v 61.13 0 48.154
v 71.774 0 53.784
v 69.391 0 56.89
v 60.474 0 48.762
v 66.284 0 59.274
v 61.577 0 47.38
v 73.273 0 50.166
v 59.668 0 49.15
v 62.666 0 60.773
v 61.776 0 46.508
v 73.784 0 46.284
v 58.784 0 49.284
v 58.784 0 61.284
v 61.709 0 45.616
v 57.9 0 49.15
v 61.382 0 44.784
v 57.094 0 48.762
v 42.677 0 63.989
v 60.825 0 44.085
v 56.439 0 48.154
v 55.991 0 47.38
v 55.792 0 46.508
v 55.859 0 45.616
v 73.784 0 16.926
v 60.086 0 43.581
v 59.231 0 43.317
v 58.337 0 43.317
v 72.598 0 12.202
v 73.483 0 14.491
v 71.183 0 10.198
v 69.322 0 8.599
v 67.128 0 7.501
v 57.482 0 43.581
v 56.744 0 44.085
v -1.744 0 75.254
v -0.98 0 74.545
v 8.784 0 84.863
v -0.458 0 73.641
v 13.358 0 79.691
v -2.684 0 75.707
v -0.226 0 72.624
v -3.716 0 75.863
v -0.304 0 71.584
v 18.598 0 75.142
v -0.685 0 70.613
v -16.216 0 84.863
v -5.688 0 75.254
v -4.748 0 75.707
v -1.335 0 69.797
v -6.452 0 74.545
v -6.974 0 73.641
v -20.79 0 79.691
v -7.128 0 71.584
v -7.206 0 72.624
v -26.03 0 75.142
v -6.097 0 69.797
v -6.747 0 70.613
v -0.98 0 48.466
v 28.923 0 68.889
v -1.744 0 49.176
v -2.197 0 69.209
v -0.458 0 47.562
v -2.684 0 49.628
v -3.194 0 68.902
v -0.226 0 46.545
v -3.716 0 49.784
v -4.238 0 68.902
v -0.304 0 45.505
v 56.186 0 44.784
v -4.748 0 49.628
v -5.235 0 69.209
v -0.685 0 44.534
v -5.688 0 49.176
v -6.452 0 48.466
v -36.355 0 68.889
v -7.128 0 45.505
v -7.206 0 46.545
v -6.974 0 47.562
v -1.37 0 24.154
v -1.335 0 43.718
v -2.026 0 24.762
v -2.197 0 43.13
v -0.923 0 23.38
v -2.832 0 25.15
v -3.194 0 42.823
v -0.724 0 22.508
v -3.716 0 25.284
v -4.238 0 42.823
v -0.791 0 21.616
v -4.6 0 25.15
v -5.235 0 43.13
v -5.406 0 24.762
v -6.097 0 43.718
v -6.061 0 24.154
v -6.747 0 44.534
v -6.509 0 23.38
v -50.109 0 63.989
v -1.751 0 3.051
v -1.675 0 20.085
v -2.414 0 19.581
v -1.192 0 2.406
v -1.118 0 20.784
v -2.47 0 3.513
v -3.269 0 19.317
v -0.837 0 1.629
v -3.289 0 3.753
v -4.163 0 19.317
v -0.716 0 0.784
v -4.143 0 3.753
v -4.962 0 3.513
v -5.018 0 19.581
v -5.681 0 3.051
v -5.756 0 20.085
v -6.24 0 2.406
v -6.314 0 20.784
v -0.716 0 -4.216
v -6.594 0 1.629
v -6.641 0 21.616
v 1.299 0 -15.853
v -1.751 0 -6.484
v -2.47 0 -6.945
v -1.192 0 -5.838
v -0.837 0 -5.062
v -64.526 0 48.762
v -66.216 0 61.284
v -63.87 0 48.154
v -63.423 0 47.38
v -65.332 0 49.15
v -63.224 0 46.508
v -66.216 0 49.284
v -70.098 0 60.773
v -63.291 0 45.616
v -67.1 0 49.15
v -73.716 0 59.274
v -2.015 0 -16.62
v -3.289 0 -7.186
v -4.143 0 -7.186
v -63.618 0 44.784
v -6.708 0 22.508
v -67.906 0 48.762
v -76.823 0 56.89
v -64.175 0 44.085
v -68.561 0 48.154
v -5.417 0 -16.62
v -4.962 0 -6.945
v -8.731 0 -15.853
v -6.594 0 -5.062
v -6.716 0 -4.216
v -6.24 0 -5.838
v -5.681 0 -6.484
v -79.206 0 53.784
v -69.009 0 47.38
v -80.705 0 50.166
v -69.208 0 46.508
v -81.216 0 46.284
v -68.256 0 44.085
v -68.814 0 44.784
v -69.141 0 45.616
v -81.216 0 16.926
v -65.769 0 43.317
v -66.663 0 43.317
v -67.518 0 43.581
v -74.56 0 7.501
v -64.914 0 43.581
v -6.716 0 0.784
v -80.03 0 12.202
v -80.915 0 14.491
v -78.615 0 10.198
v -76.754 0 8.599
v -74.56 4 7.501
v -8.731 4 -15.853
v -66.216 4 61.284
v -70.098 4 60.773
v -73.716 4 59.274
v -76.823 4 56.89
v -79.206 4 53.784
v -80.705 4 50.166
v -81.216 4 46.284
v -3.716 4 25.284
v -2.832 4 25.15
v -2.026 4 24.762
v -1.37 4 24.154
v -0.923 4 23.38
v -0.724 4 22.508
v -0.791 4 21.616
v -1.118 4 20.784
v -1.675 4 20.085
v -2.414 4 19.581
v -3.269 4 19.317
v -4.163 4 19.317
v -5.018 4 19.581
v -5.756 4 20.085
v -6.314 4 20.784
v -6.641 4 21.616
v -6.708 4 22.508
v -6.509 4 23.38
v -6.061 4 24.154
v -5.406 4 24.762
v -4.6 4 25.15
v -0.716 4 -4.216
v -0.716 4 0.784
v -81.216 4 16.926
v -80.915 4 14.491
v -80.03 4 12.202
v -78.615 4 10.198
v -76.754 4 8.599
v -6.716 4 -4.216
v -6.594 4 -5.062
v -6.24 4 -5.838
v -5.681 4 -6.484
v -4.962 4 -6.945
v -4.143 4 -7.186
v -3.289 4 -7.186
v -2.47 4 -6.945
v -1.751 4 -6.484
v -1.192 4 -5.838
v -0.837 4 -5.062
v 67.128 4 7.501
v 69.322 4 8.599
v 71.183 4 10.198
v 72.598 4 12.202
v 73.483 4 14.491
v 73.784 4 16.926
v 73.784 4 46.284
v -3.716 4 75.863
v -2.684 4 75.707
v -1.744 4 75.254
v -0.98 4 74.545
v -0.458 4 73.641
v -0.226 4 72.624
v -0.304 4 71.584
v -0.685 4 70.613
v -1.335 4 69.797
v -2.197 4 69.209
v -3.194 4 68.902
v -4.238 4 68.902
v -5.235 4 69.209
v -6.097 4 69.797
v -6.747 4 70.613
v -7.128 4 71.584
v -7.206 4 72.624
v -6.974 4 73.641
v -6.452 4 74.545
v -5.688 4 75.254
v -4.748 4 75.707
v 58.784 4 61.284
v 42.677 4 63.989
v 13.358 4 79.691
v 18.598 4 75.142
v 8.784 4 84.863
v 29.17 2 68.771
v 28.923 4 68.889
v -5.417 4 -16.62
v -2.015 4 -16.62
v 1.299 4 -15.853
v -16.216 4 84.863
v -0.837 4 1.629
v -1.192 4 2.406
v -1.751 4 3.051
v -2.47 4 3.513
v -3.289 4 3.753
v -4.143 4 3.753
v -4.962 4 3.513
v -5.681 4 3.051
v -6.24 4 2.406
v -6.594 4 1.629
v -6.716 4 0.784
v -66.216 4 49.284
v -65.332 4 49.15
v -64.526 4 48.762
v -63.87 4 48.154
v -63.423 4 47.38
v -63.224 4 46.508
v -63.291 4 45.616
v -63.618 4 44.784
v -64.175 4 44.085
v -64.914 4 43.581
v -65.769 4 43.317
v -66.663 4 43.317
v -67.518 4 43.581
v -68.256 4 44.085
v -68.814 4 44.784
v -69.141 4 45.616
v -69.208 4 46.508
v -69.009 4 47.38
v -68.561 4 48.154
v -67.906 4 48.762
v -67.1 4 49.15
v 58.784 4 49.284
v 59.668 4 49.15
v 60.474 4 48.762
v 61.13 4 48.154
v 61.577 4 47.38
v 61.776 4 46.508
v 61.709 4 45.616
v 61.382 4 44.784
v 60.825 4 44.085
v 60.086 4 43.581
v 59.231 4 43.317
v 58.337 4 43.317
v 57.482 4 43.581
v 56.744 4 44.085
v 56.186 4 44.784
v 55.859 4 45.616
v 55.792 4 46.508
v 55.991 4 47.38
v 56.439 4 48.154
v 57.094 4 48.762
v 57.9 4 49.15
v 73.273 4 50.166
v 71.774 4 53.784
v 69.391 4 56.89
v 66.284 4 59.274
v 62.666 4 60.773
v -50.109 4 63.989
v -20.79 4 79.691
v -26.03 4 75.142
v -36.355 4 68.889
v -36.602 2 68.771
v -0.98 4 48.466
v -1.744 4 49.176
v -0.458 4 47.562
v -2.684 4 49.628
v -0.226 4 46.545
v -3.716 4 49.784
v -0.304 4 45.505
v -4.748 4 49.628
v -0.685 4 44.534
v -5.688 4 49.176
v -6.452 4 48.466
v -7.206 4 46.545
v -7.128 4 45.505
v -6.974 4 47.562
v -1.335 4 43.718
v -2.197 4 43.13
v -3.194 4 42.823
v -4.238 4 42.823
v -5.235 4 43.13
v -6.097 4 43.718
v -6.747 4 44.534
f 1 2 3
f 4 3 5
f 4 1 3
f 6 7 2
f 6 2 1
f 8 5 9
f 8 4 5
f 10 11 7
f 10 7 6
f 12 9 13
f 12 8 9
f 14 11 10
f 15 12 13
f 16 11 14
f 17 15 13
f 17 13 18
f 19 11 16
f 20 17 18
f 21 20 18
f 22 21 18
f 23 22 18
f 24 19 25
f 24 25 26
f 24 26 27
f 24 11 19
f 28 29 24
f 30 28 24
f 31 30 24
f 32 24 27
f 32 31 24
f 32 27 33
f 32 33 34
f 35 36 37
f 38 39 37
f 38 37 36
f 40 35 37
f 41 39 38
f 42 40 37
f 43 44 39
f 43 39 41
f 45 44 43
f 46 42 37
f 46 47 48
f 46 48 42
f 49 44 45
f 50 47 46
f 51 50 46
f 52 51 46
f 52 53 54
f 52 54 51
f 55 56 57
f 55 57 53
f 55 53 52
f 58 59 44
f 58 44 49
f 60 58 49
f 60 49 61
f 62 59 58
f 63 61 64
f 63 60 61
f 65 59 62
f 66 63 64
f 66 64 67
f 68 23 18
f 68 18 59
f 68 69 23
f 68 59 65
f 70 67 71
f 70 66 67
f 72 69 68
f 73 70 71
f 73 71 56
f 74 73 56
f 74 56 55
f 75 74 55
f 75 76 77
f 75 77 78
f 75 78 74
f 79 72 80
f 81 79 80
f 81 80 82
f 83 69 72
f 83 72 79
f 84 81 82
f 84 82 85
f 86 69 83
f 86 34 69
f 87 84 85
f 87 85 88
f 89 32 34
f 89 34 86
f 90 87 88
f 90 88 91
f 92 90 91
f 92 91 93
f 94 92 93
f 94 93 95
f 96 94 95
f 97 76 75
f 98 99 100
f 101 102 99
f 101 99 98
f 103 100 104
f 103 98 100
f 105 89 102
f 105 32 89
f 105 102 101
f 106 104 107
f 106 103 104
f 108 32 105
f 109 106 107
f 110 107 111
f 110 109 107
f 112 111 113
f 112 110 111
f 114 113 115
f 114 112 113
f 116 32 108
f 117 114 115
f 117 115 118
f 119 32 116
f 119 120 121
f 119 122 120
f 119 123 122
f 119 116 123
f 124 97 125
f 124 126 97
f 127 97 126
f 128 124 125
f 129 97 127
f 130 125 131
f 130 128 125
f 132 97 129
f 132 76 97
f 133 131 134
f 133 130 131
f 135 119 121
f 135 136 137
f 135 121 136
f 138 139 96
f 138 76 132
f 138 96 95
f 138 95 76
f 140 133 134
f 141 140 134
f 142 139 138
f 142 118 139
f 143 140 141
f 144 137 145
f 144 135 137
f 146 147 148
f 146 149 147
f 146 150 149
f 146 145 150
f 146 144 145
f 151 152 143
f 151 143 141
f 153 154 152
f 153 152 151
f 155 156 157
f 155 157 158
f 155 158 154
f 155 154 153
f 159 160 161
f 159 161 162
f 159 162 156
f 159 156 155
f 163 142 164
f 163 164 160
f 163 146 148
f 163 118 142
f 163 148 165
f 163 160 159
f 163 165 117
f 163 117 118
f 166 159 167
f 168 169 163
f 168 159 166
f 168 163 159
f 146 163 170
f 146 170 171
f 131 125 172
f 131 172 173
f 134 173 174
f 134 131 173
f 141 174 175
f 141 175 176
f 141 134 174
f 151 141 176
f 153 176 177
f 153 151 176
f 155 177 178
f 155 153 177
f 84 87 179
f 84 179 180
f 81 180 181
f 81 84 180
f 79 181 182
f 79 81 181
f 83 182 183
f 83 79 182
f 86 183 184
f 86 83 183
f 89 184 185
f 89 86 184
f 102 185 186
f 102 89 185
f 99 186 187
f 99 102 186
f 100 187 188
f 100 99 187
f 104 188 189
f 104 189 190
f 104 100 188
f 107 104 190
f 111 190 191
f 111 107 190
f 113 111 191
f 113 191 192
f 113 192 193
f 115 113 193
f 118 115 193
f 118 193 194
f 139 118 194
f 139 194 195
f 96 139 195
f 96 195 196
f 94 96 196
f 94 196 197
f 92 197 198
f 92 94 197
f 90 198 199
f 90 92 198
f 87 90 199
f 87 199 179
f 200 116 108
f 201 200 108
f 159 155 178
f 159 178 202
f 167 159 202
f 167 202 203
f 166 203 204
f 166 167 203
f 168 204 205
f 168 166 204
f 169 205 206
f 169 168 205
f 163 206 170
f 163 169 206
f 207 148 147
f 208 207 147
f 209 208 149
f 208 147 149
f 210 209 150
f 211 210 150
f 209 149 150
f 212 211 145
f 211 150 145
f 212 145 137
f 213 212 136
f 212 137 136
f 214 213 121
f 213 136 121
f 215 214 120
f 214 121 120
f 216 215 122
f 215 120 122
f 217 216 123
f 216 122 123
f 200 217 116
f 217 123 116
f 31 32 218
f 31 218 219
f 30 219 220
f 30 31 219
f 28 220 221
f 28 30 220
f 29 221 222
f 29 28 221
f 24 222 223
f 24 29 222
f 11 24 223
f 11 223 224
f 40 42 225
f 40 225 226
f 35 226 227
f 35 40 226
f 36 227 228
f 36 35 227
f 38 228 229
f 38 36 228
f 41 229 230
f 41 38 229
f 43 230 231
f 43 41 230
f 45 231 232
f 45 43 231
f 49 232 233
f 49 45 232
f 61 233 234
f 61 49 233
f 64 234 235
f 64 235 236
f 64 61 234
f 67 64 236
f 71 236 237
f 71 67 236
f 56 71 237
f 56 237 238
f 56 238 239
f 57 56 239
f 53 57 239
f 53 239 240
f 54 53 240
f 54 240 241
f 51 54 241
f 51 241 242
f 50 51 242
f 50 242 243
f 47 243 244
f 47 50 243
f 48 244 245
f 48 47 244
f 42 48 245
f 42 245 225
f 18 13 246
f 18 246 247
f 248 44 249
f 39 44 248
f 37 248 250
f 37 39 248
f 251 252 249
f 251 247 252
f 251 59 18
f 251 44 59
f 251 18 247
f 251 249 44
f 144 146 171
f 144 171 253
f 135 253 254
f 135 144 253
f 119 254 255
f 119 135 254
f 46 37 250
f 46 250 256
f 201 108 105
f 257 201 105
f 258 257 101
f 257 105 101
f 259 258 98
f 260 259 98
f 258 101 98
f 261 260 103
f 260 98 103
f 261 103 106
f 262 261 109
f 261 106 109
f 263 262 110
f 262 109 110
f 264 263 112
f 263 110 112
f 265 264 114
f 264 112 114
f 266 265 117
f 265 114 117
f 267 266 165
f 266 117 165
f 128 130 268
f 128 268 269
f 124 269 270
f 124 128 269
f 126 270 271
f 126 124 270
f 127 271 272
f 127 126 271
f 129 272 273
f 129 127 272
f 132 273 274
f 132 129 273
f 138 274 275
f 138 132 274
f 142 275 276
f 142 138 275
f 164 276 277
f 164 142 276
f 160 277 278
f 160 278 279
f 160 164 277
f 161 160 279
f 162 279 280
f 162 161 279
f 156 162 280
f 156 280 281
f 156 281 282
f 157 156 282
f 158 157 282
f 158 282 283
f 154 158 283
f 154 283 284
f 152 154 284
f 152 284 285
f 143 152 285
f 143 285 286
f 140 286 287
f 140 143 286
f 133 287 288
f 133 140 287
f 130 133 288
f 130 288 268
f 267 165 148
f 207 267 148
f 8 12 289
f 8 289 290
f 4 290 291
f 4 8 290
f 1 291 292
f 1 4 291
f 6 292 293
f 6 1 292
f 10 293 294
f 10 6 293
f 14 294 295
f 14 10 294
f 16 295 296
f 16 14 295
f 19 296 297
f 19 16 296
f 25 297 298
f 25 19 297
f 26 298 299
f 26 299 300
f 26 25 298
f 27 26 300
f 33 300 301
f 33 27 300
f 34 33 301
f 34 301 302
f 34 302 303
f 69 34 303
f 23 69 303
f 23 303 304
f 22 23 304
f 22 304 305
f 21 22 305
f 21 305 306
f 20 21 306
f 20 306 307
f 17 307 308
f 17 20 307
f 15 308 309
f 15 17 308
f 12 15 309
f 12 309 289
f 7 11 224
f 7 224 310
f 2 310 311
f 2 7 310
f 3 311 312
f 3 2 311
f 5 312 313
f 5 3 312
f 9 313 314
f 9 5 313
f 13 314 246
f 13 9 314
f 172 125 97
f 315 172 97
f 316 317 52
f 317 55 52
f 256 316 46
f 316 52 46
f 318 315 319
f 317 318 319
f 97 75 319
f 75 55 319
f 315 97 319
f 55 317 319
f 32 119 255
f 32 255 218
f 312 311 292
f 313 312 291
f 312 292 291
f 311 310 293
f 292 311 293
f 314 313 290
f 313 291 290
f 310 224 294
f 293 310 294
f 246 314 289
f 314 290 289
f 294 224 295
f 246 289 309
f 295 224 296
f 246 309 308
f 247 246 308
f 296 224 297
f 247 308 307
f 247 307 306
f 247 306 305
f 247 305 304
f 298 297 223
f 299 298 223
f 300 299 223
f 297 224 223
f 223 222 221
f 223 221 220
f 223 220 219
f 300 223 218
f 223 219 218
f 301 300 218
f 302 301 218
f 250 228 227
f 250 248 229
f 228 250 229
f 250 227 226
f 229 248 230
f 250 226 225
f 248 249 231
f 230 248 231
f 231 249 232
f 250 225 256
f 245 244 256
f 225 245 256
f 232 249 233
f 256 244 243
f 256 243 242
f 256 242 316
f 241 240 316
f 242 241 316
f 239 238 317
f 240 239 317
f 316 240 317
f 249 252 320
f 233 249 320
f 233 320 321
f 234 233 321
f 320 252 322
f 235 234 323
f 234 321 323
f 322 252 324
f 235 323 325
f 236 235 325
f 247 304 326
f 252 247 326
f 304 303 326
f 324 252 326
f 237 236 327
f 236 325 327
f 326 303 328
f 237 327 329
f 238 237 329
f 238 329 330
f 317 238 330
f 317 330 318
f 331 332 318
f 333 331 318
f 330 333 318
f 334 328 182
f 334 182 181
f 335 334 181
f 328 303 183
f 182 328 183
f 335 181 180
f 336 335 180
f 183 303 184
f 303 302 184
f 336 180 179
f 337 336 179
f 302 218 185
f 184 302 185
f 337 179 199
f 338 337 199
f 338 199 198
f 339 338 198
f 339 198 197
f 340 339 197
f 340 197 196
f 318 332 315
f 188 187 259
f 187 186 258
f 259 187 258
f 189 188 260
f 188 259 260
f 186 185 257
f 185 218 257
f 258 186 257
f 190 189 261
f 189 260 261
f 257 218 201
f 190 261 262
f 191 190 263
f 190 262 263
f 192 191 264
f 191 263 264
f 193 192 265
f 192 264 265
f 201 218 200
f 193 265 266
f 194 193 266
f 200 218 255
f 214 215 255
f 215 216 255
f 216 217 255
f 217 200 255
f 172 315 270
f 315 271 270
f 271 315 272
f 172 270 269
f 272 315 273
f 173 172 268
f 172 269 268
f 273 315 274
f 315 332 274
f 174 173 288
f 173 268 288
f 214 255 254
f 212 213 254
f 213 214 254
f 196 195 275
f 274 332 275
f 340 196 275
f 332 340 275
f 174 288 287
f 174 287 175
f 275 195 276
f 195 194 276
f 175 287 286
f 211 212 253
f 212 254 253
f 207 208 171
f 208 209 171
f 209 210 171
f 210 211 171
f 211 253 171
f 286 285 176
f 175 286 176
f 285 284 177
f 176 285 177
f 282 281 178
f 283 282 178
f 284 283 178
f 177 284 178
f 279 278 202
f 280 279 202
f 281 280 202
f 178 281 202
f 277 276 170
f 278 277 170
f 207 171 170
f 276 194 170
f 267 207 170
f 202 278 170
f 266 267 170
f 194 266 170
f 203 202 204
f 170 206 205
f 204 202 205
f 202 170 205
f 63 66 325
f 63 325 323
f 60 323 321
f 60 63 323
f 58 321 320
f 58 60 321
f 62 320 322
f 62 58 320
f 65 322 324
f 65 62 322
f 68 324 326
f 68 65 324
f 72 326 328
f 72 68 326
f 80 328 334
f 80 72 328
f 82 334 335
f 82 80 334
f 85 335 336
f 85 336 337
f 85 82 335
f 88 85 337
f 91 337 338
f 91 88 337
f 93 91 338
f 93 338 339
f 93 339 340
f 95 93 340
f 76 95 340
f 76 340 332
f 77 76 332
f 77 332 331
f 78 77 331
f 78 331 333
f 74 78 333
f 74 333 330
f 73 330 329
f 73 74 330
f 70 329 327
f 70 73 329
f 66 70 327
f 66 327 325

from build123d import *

# Parameters (mm, degrees)
SKETCH2_R              = 3
SKETCH2_R_2            = 3.5
MAINPLATEEXTRUDE_DEPTH = 4


with BuildPart() as part:
    # Sketch2 → MainPlateExtrude (new body)
    with BuildSketch(Plane(origin=(0, 0, 0), x_dir=(1, 0, 0), z_dir=(0, 1, 0))):
        with BuildLine():
            Line((-81.215970545, -46.28367362), (-81.215970545, -16.925572983))
            ThreePointArc((-81.215970545, -16.925572983), (-79.384065752, -11.156498475), (-74.559526408, -7.501103014))
            Line((-74.559526408, -7.501103014), (-8.731304339, 15.853031333))
            ThreePointArc((-8.731304339, 15.853031333), (-3.715970545, 16.71632638), (1.299363248, 15.853031333))
            Line((1.299363248, 15.853031333), (67.127585317, -7.501103014))
            ThreePointArc((67.127585317, -7.501103014), (71.952124662, -11.156498475), (73.784029455, -16.925572983))
            Line((73.784029455, -16.925572983), (73.784029455, -46.28367362))
            ThreePointArc((73.784029455, -46.28367362), (69.390631173, -56.890275338), (58.784029455, -61.28367362))
            add(Edge.make_bspline(
                [(58.784029455, -61.28367362), (24.556467528, -64.469839896), (8.784029455, -84.862635588)],
                knots=[0, 0, 0, 0.615675344, 0.615675344, 0.615675344], degree=2))
            Line((8.784029455, -84.862635588), (-16.215970545, -84.862635588))
            add(Edge.make_bspline(
                [(-66.215970545, -61.28367362), (-31.988408619, -64.469839896), (-16.215970545, -84.862635588)],
                knots=[0, 0, 0, 0.615675344, 0.615675344, 0.615675344], degree=2))
            ThreePointArc((-66.215970545, -61.28367362), (-76.822572263, -56.890275338), (-81.215970545, -46.28367362))
        make_face()
        with Locations(Location((-66.215970545, -46.28367362, 0), (0, 0, 270))):
            Circle(SKETCH2_R, mode=Mode.SUBTRACT)
        with Locations(Location((58.784029455, -46.28367362, 0), (0, 0, 270))):
            Circle(SKETCH2_R, mode=Mode.SUBTRACT)
        with Locations(Location((-3.715970545, -46.28367362, 0), (0, 0, 270))):
            Circle(SKETCH2_R_2, mode=Mode.SUBTRACT)
        with Locations(Location((-3.715970545, -72.362635588, 0), (0, 0, 270))):
            Circle(SKETCH2_R_2, mode=Mode.SUBTRACT)
        with Locations(Location((-3.715970545, -22.28367362, 0), (0, 0, 270))):
            Circle(SKETCH2_R, mode=Mode.SUBTRACT)
        with BuildLine():
            Line((-0.715970545, 4.21632638), (-0.715970545, -0.78367362))
            ThreePointArc((-0.715970545, -0.78367362), (-3.715970545, -3.78367362), (-6.715970545, -0.78367362))
            Line((-6.715970545, -0.78367362), (-6.715970545, 4.21632638))
            ThreePointArc((-6.715970545, 4.21632638), (-3.715970545, 7.21632638), (-0.715970545, 4.21632638))
        make_face(mode=Mode.SUBTRACT)
    extrude(amount=MAINPLATEEXTRUDE_DEPTH)


solid = part.part
